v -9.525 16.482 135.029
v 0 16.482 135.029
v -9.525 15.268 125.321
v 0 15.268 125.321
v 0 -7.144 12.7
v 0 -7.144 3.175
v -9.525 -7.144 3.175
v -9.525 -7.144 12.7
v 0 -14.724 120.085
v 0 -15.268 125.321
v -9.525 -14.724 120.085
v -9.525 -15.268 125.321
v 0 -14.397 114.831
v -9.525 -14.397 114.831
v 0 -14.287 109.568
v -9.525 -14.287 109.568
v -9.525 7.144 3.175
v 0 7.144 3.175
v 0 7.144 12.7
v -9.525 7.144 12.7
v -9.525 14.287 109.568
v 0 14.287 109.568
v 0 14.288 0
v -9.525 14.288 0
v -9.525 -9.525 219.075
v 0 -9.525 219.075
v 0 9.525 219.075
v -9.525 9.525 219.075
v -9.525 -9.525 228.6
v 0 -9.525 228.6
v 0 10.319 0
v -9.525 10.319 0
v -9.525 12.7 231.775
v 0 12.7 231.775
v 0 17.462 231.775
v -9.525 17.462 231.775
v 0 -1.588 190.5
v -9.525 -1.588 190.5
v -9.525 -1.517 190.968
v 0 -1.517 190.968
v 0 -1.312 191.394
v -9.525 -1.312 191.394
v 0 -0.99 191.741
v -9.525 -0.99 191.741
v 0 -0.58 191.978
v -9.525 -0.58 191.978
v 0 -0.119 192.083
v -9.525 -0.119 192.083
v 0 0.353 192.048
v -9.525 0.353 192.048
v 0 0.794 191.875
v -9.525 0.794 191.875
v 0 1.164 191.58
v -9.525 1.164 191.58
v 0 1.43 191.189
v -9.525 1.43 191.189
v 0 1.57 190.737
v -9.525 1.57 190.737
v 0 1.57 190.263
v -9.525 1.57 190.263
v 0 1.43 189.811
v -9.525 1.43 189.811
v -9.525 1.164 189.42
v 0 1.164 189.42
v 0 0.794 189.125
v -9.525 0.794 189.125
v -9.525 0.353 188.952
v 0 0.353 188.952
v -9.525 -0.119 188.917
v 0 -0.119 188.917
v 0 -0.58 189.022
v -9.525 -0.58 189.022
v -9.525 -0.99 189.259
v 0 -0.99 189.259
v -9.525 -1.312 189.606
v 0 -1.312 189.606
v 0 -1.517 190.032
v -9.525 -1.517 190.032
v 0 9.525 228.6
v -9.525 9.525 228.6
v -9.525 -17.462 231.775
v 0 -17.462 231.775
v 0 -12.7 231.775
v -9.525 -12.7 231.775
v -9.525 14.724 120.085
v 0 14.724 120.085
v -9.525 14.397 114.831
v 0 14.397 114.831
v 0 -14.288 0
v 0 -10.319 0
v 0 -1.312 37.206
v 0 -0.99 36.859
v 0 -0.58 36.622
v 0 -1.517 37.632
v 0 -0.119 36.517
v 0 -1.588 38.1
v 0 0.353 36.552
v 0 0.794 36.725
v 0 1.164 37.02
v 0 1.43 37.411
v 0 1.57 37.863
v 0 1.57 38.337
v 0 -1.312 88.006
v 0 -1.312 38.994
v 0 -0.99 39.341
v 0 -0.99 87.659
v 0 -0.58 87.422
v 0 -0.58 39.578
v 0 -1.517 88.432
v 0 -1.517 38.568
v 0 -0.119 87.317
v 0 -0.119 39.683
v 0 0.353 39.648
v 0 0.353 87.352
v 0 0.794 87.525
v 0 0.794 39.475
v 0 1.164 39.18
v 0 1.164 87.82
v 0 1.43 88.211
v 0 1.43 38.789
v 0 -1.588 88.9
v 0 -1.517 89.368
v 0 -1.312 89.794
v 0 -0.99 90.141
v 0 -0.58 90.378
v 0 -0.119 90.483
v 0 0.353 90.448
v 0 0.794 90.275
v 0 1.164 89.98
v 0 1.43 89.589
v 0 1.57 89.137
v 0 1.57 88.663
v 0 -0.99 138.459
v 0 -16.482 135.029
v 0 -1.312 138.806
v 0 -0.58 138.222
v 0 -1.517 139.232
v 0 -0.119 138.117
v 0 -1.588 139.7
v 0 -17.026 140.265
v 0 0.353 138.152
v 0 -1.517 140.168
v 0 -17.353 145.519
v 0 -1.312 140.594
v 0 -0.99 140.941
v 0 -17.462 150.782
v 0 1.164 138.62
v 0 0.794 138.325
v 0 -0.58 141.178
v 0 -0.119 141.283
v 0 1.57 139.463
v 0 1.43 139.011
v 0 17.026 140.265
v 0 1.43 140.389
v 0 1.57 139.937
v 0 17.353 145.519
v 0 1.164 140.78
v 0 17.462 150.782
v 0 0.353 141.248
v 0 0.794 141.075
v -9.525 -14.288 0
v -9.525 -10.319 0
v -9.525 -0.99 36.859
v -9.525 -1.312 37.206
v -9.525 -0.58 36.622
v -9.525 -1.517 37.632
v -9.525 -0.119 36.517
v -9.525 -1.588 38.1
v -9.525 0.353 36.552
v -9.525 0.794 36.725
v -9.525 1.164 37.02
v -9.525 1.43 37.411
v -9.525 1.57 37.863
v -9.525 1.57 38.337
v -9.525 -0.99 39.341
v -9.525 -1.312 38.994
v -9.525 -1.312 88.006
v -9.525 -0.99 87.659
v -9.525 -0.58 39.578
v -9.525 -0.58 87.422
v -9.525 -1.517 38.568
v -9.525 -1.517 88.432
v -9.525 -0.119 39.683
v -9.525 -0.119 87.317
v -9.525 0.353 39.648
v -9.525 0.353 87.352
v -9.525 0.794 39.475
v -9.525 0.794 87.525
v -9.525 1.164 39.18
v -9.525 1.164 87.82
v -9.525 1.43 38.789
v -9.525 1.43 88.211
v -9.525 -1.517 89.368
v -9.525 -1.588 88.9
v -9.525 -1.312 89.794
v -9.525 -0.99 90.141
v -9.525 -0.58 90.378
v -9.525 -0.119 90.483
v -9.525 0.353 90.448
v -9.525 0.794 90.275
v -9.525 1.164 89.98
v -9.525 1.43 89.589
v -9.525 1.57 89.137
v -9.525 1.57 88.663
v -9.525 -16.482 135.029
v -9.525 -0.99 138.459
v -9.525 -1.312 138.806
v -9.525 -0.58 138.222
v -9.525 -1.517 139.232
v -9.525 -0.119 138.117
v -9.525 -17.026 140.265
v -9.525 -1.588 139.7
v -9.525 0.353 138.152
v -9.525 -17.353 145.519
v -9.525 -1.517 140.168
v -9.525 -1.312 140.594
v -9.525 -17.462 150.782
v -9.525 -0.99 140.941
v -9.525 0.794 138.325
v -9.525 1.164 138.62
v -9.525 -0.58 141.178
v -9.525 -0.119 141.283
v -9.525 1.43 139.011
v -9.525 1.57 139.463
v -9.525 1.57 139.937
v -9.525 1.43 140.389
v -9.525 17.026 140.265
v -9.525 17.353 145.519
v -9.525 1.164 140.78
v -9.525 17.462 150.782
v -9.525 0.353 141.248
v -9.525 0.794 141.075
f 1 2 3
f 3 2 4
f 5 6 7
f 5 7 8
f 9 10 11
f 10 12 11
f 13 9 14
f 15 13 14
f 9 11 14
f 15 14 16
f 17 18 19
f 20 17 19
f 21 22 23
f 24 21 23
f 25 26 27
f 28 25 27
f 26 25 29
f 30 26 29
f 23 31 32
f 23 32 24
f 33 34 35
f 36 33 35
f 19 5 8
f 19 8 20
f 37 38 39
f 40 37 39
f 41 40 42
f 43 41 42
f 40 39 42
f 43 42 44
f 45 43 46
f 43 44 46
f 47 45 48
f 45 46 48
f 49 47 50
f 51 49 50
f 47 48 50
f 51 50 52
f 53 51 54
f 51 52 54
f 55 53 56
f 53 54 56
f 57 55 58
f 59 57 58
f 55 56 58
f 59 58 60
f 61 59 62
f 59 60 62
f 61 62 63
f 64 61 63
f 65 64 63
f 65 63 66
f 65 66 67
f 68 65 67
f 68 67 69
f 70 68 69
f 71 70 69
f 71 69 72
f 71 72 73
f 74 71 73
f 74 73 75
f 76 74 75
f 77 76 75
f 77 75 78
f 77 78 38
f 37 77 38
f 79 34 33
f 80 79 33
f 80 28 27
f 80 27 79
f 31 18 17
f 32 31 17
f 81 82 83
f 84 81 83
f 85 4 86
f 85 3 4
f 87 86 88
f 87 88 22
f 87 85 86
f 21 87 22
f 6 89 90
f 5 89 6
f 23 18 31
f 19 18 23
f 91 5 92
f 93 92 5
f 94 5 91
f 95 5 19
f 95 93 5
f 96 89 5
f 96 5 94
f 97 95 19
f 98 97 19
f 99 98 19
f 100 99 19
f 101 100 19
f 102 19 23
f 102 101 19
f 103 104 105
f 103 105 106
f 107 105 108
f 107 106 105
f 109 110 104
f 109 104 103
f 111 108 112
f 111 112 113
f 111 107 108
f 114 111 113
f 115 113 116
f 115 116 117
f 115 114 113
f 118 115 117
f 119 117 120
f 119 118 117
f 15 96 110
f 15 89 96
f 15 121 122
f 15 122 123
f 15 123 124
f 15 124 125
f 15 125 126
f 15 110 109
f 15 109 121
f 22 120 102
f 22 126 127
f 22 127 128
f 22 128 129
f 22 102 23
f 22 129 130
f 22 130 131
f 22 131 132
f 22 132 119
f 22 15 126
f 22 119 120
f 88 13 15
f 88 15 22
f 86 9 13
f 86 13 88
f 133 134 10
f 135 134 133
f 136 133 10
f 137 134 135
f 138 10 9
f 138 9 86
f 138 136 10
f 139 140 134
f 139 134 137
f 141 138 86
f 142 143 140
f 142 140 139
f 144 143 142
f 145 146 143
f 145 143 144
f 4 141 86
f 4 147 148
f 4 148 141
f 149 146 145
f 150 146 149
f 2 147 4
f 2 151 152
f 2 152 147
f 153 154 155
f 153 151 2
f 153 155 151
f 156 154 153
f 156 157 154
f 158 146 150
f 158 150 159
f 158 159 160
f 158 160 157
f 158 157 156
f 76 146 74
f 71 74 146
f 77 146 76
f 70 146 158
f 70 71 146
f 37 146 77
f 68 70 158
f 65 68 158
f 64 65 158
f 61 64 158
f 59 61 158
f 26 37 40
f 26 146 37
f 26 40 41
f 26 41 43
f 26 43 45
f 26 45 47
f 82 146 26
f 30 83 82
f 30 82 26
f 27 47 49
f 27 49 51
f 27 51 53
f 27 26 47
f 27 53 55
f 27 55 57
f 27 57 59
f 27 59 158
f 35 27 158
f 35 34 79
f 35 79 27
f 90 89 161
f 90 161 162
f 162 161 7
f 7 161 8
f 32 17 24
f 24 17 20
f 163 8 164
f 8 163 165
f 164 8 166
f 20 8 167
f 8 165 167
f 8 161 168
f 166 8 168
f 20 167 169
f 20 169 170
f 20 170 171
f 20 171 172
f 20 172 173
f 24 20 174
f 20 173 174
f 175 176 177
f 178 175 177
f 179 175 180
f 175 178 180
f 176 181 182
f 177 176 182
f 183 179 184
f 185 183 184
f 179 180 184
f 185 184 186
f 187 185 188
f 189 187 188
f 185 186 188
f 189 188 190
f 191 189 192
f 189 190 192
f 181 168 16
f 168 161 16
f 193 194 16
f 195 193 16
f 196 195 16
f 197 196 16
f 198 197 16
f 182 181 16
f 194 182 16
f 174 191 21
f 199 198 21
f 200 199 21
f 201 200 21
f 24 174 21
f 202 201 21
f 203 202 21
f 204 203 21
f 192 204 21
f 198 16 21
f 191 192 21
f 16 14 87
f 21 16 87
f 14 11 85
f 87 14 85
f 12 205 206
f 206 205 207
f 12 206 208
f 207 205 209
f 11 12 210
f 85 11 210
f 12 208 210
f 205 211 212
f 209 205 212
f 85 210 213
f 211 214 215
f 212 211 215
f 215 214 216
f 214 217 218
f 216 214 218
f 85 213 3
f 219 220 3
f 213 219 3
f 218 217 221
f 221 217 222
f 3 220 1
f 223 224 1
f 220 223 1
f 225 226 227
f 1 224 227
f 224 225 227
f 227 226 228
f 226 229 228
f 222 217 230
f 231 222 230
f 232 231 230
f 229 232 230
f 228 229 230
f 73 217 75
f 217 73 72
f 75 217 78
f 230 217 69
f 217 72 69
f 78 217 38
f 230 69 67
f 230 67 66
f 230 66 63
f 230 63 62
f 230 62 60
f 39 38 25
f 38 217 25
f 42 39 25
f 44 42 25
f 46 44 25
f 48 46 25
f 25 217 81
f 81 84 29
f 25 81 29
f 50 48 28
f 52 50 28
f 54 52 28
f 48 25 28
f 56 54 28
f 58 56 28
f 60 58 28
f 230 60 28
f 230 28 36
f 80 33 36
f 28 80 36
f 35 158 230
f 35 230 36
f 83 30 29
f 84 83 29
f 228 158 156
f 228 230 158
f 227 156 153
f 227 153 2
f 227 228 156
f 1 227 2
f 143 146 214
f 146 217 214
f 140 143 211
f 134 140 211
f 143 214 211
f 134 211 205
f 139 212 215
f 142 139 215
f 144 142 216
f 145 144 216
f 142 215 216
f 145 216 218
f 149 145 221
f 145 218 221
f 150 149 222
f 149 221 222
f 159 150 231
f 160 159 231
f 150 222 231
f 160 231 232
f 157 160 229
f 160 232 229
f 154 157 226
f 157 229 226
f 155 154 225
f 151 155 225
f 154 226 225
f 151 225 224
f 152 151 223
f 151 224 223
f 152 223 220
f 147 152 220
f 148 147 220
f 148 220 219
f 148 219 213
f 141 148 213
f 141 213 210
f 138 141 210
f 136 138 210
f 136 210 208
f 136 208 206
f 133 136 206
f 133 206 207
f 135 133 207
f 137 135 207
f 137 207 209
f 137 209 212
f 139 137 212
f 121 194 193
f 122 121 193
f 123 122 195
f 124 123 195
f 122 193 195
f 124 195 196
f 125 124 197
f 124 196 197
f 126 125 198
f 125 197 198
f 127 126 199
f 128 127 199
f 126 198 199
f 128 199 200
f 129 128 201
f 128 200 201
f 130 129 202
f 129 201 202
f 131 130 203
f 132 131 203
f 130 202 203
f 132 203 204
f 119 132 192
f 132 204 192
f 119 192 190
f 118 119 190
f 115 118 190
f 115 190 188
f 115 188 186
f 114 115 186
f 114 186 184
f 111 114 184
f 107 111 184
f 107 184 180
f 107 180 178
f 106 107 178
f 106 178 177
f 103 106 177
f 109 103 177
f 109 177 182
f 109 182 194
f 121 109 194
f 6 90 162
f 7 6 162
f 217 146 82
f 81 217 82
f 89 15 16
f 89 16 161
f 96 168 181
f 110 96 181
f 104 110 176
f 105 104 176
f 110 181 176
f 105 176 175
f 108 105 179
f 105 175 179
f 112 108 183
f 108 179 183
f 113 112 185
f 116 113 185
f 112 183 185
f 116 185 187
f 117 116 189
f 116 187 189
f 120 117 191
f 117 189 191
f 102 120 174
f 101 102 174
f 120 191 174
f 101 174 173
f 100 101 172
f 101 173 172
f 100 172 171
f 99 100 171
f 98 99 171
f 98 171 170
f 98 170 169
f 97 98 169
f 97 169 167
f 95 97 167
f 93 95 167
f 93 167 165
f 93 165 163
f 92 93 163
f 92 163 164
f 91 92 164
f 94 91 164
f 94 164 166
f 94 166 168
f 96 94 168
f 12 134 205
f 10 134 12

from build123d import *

# Parameters (mm, degrees)
F0_W     = 34.925
F0_H     = 231.775
F1_DEPTH = 9.525
F3_DEPTH = 9.525
F4_R     = 127
F5_W     = 19.05
F5_H     = 12.7
F5_W_2   = 14.2875
F6_DEPTH = 9.525
F7_SIZE  = 3.175
F9_D     = 3.175


# Not quite as in the source:
# - a pattern or mirror of a feature is missing from the dataset's text; its kind, count and spacing are read off the source's solid


with BuildPart() as f1:
    # F0 (on Right) → F1 (new body)
    with BuildSketch(Plane.YZ):
        with Locations((0, 115.8875)):
            Rectangle(F0_W, F0_H)
    extrude(amount=-F1_DEPTH)

    # F2 (on face) → F3 (cut, through all)
    with BuildSketch(Plane.YZ):
        Polygon((14.2875, 117.475), (14.2875, 0), (17.4625, 0), (17.4625, 142.875), align=None)
    f3 = extrude(amount=-F3_DEPTH, mode=Mode.SUBTRACT)

    # F3_copies: F3 across plane
    add(f3.mirror(Plane(origin=(0, 0, 0), x_dir=(0, 0, -1), z_dir=(0, -1, 0))), mode=Mode.SUBTRACT)

    # F4
    f4_edges = [f1.edges().sort_by_distance(p)[0] for p in [
        (-4.7625, 14.2875, 117.475),
        (-4.7625, 17.4625, 142.875),
        (-4.7625, -17.4625, 142.875),
        (-4.7625, -14.2875, 117.475),
    ]]
    fillet(f4_edges, radius=F4_R)

    # F5 (on face) → F6 (cut, through all)
    with BuildSketch(Plane.YZ):
        with Locations((0, 225.425)):
            Rectangle(F5_W, F5_H)
        with Locations((0, 6.35)):
            Rectangle(F5_W_2, F5_H)
    extrude(amount=-F6_DEPTH, mode=Mode.SUBTRACT)

    # F7
    f7_edges = [f1.edges().sort_by_distance(p)[0] for p in [
        (-4.7625, -9.525, 231.775),
        (-4.7625, 9.525, 231.775),
        (-4.7625, -7.14375, 0),
        (-4.7625, 7.14375, 0),
    ]]
    chamfer(f7_edges, length=F7_SIZE)

    # F9 (through all)
    with Locations(Plane.YZ):
        with Locations((0, 139.7), (0, 88.9), (0, 190.5), (0, 38.1)):
            Hole(F9_D / 2)


solid = f1.part
